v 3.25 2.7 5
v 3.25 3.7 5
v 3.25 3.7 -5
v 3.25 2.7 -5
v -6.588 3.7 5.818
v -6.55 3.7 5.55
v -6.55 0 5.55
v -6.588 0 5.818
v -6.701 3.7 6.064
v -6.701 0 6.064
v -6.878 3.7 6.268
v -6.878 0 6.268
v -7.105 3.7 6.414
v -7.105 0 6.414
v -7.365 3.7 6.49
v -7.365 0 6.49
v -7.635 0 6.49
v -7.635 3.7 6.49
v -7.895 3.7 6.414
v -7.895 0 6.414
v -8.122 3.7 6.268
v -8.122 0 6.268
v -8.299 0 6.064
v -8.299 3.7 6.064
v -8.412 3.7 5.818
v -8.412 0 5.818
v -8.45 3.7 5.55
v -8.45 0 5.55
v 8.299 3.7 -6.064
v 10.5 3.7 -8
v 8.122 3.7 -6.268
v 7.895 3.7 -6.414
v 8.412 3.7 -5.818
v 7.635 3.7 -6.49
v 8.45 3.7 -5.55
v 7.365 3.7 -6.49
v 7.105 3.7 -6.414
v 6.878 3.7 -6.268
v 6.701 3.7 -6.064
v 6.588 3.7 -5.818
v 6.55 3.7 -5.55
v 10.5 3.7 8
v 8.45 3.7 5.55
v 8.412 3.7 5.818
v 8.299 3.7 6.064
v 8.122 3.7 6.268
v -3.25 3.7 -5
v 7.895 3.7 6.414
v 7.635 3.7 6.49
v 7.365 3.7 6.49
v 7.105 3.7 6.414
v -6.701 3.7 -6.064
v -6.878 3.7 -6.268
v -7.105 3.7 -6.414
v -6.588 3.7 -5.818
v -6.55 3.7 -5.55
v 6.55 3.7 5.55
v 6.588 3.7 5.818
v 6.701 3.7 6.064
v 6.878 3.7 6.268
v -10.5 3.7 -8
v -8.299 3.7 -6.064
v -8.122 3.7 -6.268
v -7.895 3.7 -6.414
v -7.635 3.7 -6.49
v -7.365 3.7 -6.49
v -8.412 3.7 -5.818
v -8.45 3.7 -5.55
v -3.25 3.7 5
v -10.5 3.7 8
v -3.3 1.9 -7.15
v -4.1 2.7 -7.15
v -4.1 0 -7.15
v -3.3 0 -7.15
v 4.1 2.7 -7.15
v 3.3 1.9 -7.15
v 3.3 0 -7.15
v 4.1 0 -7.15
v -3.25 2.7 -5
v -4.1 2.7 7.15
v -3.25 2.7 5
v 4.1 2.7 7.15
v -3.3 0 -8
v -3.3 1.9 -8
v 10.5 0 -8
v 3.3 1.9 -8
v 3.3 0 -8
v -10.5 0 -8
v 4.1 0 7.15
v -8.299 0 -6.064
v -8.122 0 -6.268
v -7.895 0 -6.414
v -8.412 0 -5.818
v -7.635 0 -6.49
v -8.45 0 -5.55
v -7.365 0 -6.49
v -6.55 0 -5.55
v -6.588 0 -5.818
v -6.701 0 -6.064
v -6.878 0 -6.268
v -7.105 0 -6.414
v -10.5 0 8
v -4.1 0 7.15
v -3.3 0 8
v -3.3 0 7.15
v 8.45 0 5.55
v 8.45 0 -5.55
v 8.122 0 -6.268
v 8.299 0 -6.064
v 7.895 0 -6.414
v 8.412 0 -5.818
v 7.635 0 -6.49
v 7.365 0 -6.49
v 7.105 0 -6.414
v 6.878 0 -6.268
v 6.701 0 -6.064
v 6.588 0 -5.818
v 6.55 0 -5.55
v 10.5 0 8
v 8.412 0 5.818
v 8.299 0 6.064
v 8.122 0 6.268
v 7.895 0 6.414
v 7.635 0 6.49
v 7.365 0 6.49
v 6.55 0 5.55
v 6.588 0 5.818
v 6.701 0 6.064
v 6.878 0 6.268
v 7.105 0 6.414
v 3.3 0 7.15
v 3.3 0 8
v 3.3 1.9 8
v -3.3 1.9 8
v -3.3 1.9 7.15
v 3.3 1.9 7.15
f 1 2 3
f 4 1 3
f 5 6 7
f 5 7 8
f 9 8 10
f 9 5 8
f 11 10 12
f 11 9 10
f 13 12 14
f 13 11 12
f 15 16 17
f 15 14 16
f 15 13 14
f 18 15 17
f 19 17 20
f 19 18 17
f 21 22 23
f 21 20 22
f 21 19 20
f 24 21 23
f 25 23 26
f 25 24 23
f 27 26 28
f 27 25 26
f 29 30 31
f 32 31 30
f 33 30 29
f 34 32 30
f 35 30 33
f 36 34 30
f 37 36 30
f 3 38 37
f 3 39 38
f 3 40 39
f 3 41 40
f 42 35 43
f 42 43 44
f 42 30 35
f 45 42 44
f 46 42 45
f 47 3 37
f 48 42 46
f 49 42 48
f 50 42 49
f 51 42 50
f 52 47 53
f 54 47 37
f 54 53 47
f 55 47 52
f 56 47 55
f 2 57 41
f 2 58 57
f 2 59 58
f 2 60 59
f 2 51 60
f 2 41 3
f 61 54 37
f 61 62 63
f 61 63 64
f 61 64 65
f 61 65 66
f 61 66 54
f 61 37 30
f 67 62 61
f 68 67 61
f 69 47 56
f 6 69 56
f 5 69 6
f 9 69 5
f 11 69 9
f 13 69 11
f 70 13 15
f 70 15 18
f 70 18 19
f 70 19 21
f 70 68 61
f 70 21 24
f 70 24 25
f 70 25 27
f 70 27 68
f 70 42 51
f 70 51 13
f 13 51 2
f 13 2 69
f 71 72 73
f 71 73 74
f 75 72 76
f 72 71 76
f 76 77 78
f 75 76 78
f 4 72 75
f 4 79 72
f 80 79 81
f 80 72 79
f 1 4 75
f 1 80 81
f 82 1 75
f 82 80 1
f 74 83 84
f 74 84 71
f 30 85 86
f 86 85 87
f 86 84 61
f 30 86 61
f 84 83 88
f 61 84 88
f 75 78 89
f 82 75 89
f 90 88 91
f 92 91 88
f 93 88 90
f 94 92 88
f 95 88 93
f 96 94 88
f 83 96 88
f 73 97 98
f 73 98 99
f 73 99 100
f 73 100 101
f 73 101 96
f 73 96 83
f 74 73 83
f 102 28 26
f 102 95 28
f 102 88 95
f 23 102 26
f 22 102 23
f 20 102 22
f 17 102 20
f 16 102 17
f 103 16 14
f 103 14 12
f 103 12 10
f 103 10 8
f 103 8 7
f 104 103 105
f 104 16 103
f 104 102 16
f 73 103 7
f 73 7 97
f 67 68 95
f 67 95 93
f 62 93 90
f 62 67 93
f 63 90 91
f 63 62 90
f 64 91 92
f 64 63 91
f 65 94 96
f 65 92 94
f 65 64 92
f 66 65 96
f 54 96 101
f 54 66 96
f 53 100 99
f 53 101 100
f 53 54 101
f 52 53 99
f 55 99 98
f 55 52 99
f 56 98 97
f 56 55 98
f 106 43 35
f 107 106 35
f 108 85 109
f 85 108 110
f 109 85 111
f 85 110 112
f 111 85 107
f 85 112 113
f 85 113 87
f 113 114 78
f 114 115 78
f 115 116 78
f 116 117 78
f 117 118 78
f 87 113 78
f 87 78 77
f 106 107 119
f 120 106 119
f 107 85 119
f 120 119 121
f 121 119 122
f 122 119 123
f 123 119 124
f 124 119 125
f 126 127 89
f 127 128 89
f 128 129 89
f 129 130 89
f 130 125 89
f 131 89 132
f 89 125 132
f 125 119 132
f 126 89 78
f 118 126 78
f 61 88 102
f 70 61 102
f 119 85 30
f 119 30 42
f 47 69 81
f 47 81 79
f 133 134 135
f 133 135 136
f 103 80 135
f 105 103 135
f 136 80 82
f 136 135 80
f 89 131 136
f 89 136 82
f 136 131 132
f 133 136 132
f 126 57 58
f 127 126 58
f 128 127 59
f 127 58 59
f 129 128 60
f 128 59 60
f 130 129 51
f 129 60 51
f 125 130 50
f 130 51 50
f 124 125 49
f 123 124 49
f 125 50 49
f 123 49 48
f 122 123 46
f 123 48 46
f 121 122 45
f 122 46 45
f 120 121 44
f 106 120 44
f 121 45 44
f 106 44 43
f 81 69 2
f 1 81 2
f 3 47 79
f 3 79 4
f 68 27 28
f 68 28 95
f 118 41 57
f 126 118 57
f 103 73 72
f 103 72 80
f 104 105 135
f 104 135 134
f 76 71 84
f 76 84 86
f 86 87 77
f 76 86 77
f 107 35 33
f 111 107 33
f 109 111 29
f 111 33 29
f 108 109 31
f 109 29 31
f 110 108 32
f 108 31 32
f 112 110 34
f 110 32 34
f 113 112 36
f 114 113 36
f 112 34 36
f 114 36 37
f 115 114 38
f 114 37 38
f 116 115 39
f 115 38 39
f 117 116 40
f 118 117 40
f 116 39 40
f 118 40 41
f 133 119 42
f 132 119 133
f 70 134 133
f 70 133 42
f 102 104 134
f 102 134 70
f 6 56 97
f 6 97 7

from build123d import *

# Parameters (mm, degrees)
SKETCH1_W           = 10
SKETCH1_H           = 16
BOSS_EXTRUDE1_DEPTH = 3.7
SKETCH2_W           = 8.2
SKETCH2_H           = 14.3
CUT_EXTRUDE1_DEPTH  = 2.7
SKETCH3_W           = 6.6
SKETCH3_H           = 16
CUT_EXTRUDE2_DEPTH  = 1.9
CUT_EXTRUDE3_REACH  = 5.7
SKETCH4_W           = 6.5
SKETCH4_H           = 10
SKETCH5_W           = 5.5
SKETCH5_H           = 16
BOSS_EXTRUDE2_DEPTH = 3.7
CUT_EXTRUDE4_DEPTH  = 4.7


with BuildPart() as part:
    # Sketch1 → Boss-Extrude1 (new body)
    with BuildSketch(Plane(origin=(0, 0, 0), x_dir=(1, 0, 0), z_dir=(0, 1, 0))):
        Rectangle(SKETCH1_W, SKETCH1_H)
    extrude(amount=BOSS_EXTRUDE1_DEPTH)

    # Sketch2 → Cut-Extrude1 (cut)
    with BuildSketch(Plane.XZ):
        Rectangle(SKETCH2_W, SKETCH2_H)
    extrude(amount=-CUT_EXTRUDE1_DEPTH, mode=Mode.SUBTRACT)

    # Sketch3 → Cut-Extrude2 (cut)
    with BuildSketch(Plane.XZ):
        Rectangle(SKETCH3_W, SKETCH3_H)
    extrude(amount=-CUT_EXTRUDE2_DEPTH, mode=Mode.SUBTRACT)

    # Sketch4 → Cut-Extrude3 (cut, up to next)
    with BuildSketch(Plane(origin=(0, 3.7, 0), x_dir=(1, 0, 0), z_dir=(0, 1, 0)), mode=Mode.PRIVATE) as cut_extrude3_sk1:
        Rectangle(SKETCH4_W, SKETCH4_H)
    cut_extrude3_tool1 = extrude(cut_extrude3_sk1.sketch, amount=-CUT_EXTRUDE3_REACH, mode=Mode.PRIVATE) & part.part
    add(cut_extrude3_tool1.solids().sort_by_distance((0, 3.7, 0))[0], mode=Mode.SUBTRACT)

    # Sketch5 → Boss-Extrude2 (add)
    with BuildSketch(Plane.XZ):
        with Locations((-7.75, 0)):
            Rectangle(SKETCH5_W, SKETCH5_H)
    boss_extrude2 = extrude(amount=-BOSS_EXTRUDE2_DEPTH)

    # Sketch6 → Cut-Extrude4 (cut, through all)
    with BuildSketch(Plane(origin=(0, 3.7, 0), x_dir=(1, 0, 0), z_dir=(0, 1, 0))):
        with BuildLine():
            Line((-6.55, 5.55), (-6.55, -5.55))
            ThreePointArc((-6.55, -5.55), (-7.5, -6.5), (-8.45, -5.55))
            Line((-8.45, -5.55), (-8.45, 5.55))
            ThreePointArc((-8.45, 5.55), (-7.5, 6.5), (-6.55, 5.55))
        make_face()
    cut_extrude4 = extrude(amount=-CUT_EXTRUDE4_DEPTH, mode=Mode.SUBTRACT)

    # Mirror1: Boss-Extrude2, Cut-Extrude4 across plane
    add(boss_extrude2.mirror(Plane(origin=(0, 0, 0), x_dir=(0, 0, 1), z_dir=(1, 0, 0))))
    add(cut_extrude4.mirror(Plane(origin=(0, 0, 0), x_dir=(0, 0, 1), z_dir=(1, 0, 0))), mode=Mode.SUBTRACT)


solid = part.part
